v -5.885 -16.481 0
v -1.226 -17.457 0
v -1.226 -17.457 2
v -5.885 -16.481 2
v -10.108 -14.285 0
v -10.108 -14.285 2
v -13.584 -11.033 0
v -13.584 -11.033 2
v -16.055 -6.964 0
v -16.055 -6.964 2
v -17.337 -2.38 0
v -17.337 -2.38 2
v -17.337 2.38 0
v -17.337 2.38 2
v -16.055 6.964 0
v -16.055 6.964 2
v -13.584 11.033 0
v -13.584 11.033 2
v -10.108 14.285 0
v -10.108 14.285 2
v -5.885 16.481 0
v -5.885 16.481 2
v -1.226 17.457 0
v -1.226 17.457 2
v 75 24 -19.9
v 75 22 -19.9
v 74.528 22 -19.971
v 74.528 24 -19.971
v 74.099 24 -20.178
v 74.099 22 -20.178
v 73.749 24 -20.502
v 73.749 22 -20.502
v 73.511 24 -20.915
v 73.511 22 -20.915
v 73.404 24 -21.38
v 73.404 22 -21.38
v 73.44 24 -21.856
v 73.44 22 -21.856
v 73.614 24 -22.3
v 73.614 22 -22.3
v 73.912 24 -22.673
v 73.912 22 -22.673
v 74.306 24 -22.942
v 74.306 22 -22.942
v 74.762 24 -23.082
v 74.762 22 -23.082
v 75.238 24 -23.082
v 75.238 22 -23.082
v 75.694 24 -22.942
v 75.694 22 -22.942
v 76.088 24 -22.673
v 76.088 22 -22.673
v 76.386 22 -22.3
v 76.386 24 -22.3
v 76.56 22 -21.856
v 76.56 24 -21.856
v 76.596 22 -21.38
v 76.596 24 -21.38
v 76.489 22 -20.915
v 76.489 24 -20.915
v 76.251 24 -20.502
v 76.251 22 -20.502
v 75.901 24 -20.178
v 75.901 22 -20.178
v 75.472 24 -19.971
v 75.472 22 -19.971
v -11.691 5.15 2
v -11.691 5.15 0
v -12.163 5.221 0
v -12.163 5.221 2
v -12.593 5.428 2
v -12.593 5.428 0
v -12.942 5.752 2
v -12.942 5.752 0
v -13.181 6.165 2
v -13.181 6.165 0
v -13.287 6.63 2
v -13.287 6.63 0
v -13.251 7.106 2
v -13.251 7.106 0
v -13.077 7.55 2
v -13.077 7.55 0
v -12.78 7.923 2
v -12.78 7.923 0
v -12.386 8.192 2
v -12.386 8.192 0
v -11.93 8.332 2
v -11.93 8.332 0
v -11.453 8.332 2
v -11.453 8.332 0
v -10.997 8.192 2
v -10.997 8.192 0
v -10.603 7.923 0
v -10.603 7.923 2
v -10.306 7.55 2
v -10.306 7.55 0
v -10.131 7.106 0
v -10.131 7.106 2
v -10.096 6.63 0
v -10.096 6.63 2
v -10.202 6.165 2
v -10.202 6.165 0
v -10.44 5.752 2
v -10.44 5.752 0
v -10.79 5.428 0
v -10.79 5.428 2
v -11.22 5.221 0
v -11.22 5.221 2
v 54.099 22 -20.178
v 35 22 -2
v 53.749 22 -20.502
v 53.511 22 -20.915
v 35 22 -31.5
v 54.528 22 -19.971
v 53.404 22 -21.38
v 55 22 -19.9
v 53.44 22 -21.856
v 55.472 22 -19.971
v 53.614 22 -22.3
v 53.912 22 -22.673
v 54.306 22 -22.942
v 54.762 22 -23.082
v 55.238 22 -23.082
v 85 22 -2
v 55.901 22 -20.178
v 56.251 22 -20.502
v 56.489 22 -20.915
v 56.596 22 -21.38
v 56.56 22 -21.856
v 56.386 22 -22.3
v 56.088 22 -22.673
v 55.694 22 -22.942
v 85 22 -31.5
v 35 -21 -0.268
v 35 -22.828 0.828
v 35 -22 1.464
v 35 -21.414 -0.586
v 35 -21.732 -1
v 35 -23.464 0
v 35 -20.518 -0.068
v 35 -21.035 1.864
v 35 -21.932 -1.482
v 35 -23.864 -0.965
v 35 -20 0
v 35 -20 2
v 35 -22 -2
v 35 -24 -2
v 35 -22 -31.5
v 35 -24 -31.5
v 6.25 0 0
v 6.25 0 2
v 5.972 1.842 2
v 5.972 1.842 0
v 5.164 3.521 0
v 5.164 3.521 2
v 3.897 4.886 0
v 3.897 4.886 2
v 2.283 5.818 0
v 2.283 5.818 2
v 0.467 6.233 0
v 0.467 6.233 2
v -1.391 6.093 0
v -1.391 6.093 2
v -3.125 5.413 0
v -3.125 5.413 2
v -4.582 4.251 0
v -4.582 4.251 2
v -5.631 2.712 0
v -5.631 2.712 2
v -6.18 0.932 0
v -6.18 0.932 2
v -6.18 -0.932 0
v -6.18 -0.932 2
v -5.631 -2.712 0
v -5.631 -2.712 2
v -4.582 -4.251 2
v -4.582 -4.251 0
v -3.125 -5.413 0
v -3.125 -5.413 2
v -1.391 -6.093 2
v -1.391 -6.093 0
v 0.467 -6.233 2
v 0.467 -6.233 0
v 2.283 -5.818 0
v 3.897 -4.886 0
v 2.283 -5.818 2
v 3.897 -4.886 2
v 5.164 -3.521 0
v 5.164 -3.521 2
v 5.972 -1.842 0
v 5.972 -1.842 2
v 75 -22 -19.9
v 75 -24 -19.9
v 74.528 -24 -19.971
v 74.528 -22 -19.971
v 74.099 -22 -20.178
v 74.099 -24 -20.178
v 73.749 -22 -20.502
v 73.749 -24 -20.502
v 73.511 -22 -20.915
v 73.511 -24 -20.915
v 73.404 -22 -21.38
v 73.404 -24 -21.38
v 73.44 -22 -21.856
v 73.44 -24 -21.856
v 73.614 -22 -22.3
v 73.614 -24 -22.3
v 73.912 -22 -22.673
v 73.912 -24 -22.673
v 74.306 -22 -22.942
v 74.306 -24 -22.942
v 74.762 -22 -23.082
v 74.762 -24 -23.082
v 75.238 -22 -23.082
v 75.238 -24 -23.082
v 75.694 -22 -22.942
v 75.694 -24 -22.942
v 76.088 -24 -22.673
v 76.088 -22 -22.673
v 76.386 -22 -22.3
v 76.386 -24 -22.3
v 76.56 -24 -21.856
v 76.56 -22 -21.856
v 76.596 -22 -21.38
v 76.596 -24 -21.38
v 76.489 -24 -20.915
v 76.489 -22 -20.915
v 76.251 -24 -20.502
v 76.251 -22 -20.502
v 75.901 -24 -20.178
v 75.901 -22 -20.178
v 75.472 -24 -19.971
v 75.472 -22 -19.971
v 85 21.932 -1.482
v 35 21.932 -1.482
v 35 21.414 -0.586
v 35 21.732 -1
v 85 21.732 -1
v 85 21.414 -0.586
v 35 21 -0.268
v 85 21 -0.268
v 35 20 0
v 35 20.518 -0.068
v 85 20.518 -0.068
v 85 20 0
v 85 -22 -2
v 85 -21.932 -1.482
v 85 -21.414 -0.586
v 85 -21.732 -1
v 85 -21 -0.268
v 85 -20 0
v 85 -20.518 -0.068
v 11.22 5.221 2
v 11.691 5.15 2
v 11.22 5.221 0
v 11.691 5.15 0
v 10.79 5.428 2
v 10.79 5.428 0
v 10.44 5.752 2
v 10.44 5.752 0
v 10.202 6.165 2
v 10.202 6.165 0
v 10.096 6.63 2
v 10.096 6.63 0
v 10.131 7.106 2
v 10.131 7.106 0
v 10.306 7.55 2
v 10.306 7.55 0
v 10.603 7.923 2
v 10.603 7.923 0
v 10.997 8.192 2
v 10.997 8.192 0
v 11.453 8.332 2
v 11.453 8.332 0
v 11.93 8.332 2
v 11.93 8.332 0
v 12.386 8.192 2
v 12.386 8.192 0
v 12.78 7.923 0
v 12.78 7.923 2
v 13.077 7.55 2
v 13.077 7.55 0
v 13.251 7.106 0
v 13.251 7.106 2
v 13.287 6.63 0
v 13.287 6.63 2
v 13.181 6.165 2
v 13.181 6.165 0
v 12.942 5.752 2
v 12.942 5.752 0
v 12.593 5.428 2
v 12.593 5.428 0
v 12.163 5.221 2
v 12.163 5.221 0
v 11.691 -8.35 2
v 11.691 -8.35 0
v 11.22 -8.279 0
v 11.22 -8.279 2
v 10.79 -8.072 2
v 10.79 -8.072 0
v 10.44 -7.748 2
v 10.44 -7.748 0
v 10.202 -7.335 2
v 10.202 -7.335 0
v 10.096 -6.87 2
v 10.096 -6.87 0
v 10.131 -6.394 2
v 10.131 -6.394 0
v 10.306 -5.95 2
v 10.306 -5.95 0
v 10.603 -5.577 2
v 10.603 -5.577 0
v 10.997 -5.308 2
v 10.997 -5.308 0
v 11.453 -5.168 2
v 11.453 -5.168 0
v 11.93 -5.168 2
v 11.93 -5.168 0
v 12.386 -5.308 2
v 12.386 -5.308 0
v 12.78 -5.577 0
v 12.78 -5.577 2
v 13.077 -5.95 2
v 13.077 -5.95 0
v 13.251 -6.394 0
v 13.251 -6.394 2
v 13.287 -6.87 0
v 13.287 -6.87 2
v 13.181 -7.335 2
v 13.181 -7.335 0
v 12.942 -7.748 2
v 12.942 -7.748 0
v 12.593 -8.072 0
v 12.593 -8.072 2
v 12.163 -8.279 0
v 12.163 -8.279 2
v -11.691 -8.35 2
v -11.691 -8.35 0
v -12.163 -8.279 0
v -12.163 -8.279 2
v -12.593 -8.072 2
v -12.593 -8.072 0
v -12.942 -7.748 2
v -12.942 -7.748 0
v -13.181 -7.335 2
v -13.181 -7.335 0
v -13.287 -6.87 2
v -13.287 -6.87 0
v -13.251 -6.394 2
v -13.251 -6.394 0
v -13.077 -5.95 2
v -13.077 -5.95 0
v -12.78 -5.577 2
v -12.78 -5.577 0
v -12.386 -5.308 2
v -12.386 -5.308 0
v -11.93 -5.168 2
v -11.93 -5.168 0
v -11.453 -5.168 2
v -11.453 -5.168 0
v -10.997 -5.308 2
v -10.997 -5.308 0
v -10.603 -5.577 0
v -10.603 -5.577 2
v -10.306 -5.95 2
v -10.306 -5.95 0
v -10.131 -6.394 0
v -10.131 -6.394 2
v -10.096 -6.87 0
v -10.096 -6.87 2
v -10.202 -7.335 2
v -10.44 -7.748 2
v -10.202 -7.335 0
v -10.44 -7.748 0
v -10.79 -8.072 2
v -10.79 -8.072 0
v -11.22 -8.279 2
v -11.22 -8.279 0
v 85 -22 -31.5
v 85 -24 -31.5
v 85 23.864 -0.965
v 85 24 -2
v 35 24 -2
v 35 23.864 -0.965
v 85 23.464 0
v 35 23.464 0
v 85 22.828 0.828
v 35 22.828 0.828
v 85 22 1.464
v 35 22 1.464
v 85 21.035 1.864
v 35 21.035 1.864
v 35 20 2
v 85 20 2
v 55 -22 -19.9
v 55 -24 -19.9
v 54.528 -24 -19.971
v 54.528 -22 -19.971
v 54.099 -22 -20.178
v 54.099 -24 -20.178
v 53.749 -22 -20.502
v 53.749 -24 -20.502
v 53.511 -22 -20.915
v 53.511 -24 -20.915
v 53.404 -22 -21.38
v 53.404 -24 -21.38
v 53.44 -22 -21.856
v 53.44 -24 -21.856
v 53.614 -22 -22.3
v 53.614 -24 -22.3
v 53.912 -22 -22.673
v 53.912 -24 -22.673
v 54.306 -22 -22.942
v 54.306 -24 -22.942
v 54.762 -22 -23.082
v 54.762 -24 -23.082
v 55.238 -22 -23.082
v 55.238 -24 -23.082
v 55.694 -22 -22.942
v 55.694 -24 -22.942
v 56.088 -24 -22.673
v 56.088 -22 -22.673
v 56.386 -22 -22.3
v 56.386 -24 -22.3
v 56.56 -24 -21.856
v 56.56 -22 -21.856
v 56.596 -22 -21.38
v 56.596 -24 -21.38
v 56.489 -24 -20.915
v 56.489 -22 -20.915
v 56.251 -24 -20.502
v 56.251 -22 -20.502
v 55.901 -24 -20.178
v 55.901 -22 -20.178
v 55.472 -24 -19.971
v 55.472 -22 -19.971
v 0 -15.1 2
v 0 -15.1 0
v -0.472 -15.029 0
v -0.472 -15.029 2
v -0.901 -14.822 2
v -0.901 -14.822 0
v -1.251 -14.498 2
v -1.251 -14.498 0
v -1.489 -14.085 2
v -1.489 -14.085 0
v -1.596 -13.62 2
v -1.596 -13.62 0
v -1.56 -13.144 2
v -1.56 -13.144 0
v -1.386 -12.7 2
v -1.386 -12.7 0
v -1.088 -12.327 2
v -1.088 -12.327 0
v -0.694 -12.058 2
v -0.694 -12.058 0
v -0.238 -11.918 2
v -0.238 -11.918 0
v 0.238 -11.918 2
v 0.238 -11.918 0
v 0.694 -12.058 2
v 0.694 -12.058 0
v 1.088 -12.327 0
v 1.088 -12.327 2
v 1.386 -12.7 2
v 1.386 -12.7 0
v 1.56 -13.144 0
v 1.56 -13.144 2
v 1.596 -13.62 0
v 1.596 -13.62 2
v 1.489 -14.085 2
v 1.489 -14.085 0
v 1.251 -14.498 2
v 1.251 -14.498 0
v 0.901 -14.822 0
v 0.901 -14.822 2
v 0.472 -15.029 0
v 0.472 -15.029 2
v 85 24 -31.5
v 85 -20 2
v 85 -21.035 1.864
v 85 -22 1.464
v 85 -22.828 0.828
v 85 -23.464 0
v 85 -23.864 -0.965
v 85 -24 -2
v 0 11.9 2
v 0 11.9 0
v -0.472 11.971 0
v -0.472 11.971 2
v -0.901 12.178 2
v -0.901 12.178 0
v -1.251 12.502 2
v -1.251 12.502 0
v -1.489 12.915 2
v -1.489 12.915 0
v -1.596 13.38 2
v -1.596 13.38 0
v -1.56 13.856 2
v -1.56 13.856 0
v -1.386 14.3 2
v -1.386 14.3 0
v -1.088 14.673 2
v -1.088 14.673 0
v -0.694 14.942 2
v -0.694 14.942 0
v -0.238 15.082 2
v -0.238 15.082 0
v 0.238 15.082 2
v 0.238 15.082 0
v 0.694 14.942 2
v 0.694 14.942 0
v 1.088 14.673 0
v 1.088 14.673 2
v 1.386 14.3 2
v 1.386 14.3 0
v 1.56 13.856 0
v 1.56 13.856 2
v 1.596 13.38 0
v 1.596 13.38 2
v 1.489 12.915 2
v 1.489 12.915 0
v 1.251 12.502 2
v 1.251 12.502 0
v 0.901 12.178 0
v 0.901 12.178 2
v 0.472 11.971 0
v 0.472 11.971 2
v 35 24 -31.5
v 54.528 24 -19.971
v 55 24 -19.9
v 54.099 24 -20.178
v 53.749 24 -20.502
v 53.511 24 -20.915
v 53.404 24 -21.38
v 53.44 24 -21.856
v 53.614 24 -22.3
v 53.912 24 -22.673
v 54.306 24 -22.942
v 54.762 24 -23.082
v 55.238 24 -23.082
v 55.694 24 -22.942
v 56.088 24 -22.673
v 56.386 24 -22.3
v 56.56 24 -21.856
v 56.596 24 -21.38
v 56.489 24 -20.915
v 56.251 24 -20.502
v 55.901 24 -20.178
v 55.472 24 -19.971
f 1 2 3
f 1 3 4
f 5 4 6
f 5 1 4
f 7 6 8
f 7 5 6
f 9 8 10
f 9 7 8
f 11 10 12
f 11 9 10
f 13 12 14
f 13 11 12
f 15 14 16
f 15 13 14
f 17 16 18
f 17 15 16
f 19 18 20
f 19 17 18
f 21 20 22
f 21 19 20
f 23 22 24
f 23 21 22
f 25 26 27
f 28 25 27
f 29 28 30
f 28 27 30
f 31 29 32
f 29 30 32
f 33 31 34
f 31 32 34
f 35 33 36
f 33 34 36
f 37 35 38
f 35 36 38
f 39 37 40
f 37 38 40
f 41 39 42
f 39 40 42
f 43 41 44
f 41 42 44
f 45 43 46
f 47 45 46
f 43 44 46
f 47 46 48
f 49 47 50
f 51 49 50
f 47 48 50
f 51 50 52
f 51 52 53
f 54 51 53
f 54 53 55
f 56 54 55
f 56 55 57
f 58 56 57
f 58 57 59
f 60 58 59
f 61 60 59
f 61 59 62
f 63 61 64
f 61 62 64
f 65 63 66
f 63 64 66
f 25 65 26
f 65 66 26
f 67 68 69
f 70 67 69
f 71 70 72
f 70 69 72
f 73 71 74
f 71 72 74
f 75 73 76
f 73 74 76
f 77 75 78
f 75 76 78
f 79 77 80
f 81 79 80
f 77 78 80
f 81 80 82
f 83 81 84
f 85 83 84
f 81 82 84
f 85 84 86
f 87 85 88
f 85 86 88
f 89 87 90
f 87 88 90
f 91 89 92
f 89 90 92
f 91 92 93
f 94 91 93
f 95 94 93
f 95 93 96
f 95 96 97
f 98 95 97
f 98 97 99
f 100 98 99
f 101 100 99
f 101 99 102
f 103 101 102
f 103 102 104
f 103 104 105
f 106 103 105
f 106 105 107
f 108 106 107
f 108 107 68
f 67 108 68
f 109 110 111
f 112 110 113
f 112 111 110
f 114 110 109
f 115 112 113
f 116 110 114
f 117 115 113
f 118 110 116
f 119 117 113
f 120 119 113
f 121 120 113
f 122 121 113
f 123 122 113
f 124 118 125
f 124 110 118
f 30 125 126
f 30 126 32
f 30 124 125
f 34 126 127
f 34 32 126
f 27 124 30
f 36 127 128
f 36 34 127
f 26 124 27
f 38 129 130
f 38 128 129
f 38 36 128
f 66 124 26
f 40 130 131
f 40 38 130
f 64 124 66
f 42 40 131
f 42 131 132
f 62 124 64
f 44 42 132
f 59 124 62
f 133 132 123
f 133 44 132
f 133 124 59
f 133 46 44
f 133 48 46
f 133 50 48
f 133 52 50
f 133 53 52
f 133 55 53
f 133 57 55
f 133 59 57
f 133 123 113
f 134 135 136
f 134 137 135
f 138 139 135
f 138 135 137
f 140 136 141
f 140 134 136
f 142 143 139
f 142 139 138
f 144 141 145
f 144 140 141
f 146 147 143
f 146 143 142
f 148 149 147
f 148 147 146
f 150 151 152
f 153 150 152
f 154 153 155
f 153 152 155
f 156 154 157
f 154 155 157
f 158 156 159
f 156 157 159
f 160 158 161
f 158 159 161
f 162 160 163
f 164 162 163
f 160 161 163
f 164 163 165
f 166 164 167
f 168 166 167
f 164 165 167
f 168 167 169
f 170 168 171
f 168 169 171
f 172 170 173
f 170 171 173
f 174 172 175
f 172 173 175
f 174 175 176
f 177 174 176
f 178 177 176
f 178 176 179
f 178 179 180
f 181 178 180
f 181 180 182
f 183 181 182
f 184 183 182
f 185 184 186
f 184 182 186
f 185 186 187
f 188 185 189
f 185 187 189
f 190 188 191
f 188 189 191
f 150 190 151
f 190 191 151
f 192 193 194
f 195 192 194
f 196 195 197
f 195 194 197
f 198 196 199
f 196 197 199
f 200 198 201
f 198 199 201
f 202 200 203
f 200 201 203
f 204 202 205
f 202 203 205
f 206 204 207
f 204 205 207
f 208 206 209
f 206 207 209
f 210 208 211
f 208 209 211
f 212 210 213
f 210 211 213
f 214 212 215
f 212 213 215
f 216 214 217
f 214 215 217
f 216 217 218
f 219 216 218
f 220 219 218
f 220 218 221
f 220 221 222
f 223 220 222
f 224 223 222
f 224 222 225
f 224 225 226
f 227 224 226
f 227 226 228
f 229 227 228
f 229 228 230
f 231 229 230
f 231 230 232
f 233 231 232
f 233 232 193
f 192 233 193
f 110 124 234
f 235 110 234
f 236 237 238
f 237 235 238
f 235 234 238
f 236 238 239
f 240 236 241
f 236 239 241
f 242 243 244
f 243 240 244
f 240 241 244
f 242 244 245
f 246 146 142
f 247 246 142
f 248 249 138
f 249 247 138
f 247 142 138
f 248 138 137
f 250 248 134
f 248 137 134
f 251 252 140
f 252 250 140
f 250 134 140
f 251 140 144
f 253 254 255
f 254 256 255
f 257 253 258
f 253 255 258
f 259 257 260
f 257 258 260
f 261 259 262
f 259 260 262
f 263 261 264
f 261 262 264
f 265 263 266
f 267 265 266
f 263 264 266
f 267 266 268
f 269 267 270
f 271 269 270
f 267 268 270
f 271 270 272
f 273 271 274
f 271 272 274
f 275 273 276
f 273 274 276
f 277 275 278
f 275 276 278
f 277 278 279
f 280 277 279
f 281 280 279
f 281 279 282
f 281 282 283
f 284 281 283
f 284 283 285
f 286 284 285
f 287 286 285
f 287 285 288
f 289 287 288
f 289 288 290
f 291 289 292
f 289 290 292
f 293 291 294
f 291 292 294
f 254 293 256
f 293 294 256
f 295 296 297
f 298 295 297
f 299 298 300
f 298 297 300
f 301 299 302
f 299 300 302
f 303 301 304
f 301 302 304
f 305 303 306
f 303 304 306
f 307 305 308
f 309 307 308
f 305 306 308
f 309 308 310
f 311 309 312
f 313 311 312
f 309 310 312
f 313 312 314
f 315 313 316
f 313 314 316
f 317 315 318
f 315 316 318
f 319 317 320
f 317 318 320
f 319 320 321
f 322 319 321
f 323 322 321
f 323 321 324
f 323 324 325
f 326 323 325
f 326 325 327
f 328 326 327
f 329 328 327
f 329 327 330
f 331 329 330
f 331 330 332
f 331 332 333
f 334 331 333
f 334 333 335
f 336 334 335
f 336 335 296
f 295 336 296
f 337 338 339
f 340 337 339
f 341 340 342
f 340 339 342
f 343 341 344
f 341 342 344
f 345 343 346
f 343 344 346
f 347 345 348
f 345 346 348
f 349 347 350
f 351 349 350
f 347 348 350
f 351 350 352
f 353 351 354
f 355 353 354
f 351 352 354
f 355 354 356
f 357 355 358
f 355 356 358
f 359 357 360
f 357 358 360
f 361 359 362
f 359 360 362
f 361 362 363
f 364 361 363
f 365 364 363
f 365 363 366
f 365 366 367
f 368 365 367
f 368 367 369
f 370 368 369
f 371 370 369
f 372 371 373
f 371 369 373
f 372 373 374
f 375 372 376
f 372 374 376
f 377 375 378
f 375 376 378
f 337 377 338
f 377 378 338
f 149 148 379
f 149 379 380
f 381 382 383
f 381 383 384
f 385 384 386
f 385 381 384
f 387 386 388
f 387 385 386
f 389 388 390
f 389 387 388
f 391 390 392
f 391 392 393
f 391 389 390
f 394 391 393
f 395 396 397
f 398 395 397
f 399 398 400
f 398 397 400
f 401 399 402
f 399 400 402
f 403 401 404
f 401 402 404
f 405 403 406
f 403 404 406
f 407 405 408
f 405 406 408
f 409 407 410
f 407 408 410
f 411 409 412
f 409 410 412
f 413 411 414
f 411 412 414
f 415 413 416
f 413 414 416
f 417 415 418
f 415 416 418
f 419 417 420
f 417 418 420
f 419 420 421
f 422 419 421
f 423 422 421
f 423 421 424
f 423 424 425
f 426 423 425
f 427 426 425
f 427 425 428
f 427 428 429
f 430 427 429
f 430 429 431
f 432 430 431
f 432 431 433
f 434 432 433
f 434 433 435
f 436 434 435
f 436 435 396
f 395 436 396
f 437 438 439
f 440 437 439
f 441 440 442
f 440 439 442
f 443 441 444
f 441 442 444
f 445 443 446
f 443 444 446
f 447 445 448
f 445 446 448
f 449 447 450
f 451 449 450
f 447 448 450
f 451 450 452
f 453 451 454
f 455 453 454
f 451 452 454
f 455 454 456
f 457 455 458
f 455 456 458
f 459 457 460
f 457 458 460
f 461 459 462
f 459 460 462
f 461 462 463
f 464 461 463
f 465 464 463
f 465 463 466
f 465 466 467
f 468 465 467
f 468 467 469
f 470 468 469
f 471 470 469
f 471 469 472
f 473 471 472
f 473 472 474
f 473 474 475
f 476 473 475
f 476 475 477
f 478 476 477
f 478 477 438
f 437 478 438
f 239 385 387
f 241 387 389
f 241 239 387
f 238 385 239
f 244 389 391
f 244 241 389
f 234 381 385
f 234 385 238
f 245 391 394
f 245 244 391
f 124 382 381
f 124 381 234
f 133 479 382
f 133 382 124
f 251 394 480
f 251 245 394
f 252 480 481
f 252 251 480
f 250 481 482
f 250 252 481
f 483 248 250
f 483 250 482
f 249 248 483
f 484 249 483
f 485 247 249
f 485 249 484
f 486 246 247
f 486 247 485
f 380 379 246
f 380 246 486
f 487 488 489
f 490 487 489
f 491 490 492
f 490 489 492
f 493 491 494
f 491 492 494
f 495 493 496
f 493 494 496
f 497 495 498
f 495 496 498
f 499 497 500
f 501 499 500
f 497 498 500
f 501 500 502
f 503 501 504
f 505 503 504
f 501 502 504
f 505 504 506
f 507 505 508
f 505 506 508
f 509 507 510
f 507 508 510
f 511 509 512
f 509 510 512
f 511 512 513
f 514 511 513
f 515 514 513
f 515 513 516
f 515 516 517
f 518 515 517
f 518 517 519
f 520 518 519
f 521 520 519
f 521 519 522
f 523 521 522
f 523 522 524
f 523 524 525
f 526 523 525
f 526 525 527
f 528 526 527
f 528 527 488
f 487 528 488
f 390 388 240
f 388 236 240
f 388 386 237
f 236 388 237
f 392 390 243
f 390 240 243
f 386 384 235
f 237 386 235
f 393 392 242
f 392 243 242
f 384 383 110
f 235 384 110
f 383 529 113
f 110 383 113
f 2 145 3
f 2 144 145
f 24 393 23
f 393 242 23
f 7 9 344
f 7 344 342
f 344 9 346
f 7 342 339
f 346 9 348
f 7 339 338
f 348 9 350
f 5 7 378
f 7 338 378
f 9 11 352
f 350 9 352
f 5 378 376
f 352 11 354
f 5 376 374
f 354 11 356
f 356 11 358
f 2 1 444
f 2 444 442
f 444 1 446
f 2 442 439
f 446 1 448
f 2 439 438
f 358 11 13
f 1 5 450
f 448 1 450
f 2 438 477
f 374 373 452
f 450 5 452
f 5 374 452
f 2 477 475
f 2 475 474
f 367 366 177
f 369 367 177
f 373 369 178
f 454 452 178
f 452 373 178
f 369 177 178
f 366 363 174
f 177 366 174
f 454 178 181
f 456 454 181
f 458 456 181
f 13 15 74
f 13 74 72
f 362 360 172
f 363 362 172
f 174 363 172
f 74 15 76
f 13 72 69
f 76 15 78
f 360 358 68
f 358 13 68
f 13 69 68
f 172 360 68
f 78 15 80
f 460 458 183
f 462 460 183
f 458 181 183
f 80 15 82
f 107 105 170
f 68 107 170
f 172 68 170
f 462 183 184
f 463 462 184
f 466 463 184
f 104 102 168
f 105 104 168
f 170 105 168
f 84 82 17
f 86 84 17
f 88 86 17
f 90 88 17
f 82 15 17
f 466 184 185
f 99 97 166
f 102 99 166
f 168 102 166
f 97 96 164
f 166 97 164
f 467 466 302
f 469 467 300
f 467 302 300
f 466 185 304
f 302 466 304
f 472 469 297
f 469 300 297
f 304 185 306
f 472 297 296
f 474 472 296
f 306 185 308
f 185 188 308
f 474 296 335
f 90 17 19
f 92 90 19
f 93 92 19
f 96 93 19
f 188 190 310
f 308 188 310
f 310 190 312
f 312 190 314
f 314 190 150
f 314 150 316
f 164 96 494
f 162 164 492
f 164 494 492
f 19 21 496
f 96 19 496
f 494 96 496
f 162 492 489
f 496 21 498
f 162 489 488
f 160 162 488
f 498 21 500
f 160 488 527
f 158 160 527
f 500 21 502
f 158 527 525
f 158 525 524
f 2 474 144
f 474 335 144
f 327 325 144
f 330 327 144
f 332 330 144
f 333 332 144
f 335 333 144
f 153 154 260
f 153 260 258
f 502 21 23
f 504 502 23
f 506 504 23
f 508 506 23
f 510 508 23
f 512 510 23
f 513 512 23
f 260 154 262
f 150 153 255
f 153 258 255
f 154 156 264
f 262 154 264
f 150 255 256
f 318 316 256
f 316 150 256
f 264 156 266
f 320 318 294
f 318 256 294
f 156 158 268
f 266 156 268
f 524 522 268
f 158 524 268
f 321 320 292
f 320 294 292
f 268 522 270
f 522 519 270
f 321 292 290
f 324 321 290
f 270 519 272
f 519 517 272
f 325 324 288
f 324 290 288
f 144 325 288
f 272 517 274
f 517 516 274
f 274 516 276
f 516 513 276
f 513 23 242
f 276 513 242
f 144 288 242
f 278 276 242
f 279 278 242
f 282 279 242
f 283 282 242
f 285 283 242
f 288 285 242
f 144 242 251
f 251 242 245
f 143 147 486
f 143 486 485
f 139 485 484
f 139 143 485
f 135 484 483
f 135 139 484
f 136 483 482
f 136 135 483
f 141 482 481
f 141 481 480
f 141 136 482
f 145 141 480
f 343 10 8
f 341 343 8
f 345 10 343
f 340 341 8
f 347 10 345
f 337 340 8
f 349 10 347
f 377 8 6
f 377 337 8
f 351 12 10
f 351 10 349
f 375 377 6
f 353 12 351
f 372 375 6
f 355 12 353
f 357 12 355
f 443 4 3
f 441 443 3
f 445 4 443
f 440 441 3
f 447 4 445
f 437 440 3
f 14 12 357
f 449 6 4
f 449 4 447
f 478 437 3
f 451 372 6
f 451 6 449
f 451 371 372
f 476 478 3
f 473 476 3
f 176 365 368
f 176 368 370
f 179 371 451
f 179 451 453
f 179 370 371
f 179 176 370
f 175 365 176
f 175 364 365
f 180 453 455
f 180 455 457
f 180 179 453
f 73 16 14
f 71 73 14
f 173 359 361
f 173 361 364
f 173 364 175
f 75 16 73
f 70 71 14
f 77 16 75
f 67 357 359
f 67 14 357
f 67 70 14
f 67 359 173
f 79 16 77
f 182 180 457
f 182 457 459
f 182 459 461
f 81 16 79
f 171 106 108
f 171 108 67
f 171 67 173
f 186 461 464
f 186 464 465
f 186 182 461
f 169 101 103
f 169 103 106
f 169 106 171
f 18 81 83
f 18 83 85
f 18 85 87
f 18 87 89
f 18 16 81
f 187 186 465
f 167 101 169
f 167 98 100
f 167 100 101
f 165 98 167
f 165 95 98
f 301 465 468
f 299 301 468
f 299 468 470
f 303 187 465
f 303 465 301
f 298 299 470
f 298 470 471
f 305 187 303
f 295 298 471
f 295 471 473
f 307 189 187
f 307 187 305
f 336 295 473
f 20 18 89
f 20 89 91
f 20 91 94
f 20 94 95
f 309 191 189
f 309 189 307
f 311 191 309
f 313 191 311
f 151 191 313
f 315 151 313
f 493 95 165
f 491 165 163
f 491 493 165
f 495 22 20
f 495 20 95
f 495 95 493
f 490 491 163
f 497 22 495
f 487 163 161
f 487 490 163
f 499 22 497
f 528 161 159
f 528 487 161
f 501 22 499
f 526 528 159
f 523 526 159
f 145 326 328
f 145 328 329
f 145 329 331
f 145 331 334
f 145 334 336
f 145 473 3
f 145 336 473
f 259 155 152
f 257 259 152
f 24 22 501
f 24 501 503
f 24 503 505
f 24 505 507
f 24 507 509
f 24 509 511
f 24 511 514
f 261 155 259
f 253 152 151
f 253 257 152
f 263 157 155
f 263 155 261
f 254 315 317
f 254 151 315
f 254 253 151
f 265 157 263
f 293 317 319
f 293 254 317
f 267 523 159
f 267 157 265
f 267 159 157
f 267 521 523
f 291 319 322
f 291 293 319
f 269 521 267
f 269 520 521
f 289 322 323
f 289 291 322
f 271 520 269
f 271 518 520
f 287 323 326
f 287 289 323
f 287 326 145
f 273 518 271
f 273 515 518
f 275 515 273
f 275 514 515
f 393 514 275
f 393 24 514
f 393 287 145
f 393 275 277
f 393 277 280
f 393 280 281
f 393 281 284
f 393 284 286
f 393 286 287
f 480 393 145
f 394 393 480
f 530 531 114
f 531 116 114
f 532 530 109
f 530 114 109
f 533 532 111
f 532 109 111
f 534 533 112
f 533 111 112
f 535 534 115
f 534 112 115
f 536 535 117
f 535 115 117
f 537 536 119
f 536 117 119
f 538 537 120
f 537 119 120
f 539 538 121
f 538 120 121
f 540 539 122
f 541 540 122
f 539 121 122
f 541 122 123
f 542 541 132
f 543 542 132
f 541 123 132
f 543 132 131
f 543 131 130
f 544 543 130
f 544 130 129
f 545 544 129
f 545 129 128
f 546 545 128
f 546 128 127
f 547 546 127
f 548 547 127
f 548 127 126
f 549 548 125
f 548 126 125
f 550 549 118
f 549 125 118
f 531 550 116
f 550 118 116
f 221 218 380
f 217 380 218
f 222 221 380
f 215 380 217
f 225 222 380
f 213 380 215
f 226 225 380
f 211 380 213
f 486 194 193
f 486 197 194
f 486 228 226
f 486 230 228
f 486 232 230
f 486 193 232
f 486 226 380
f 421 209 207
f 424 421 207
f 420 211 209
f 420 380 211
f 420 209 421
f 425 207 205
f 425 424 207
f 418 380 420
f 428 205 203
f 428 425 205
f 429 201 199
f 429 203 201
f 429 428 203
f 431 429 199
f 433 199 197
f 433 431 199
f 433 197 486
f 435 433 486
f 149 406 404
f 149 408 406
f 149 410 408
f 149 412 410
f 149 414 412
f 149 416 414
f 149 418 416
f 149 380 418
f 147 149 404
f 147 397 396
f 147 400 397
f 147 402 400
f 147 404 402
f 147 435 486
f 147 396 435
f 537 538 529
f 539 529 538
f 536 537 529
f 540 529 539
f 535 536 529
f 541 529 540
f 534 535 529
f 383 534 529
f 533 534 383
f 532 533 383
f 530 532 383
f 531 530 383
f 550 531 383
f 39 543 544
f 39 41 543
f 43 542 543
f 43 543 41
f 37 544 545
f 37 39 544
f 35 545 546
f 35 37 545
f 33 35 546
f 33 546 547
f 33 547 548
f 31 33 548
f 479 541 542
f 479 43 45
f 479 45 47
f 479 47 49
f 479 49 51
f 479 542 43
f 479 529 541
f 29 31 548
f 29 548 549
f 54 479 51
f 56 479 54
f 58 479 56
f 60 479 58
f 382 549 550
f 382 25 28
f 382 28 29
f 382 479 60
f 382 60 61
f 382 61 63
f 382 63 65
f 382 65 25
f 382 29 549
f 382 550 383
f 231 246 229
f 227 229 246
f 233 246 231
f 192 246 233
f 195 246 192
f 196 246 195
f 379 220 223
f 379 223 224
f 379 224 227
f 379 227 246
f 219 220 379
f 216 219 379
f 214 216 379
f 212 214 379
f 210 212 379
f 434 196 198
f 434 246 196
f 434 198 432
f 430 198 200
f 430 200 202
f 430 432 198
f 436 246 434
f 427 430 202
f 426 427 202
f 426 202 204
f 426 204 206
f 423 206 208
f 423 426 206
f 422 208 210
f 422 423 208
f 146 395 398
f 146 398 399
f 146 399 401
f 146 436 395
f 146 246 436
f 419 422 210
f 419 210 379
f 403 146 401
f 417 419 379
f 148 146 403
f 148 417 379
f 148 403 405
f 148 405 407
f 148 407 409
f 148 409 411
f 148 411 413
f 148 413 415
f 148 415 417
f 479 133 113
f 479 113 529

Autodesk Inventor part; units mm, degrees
ref_plane "YZ Plane" through (0, 0, 0) normal (1, 0, 0) x (0, 1, 0)
ref_plane "XZ Plane" through (0, 0, 0) normal (0, 1, 0) x (-1, 0, 0)
ref_plane "XY Plane" through (0, 0, 0) normal (0, 0, 1) x (1, 0, 0)
sketch "スケッチ1" plane through (0, 0, 0) normal (0, 0, 1) x (1, 0, 0)
  circle A0 centre (0, 0) radius 17.5
  line L0 (0, 0) -> (35, 0)
  line L1 (35, 0) -> (35, 20)
  line L2 (35, 20) -> (-1.2255, 17.457)
  line L3 (35, 20) -> (85, 20)
  line L4 (85, 20) -> (85, 0)
  line L5 (85, 0) -> (35, 0)
  line L6 (35, 0) -> (35, 20)
  line L7 (35, 0) -> (35, -20)
  line L8 (35, -20) -> (-1.2255, -17.457)
  line L9 (35, -20) -> (85, -20)
  line L10 (85, -20) -> (85, 0)
  point P0 (-1.2255, -17.457)
  dimension "d0" = 35
  dimension "d1" = 35
  dimension "d2" = 20
  dimension "d3" = 20
  dimension "d4" = 50
extrude "プレート1" add sketch "スケッチ1" along normal blind 2
sketch "スケッチ2" plane through (85, 22, -2) normal (0, 1, 0) x (-1, 0, 0)
  line L0 (50, 0) -> (0, 0)
  line L1 (0, 0) -> (0, -29.5)
  line L2 (0, -29.5) -> (50, -29.5)
  line L3 (50, -29.5) -> (50, 0)
edge flange "フランジ1" height 33.5 angle 90 thickness 2 bend radius 2 thickness toward (0, 1, 0) relief tear relief width 2 relief depth 1 corner gap 2 corner form 0 edges at (60, 20, 0) (60, -20, 0) wall of the first edge with corners at (35, 22, -2) (85, 22, -2) (85, 22, -31.5) (35, 22, -31.5)
bend "曲げ1"
corner "コーナー1"
sketch "スケッチ3" plane through (0, 0, 2) normal (0, 0, 1) x (1, 0, 0)
  circle A0 centre (0, 0) radius 13.5
  point P0 (0, 13.5)
  point P1 (-11.6913, 6.75)
  point P2 (-11.6913, -6.75)
  point P3 (0, -13.5)
  point P4 (11.6913, -6.75)
  point P5 (11.6913, 6.75)
  dimension "d16" = 27
  dimension "d19" = 360
hole "穴1" at (0, 13.5, 2) at (-11.6913, 6.75, 2) at (-11.6913, -6.75, 2) at (0, -13.5, 2) at (11.6913, -6.75, 2) at (11.6913, 6.75, 2) direction (0, 0, -1) diameter 3.2 end through all
sketch "スケッチ4" plane through (0, 0, 2) normal (0, 0, 1) x (1, 0, 0)
  arc A0 (-1.2255, 17.457) -> (-1.2255, -17.457) centre (0, 0) ccw projected
  circle A1 centre (0, 0) radius 6.25
  dimension "d28" = 12.5
extrude "押し出し1" cut sketch "スケッチ4" against normal blind 10
sketch "スケッチ5" plane through (35, 24, -31.5) normal (0, 1, 0) x (1, 0, 0)
  line L0 (0, 0) -> (0, -29.5) projected
  line L1 (0, -10) -> (50, -10)
  line L2 (50, -29.5) -> (50, 0) projected
  line L3 (50, 0) -> (0, 0) projected
  line L4 (10, 0) -> (10, -29.5)
  line L5 (0, -29.5) -> (50, -29.5) projected
  point P0 (-35, -31.5)
  point P1 (20, -10)
  point P2 (40, -10)
  dimension "d31" = 10
  dimension "d32" = 10
  dimension "d33" = 10
  dimension "d34" = 20
hole "穴2" at (55, 24, -21.5) at (75, 24, -21.5) direction (0, -1, 0) diameter 3.2 end through all
equation "\"d26\" = Thickness"
equation "\"d5\" = Thickness"
equation "\"d6\" = BendReliefWidth"
equation "\"d7\" = BendReliefDepth"
equation "\"d8\" = MinimumRemnant"
equation "\"d9\" = TransitionRadius"
equation "\"d12\" = BendRadius"
equation "\"d13\" = CornerReliefSize"
equation "\"d14\" = GapSize"
equation "\"d15\" = JacobiRadiusSize"
equation "\"BendRadius\" = Thickness"
equation "\"BendReliefWidth\" = Thickness"
equation "\"BendReliefDepth\" = 0.5 * Thickness"
equation "\"CornerReliefSize\" = 4 * Thickness"
equation "\"MinimumRemnant\" = 2 * Thickness"
equation "\"TransitionRadius\" = BendRadius"
equation "\"JacobiRadiusSize\" = BendRadius"
equation "\"GapSize\" = Thickness"
equation "\"Thickness\" = 2"
properties part number "servoplate1_forR0" material "アルミニウム 6061"
